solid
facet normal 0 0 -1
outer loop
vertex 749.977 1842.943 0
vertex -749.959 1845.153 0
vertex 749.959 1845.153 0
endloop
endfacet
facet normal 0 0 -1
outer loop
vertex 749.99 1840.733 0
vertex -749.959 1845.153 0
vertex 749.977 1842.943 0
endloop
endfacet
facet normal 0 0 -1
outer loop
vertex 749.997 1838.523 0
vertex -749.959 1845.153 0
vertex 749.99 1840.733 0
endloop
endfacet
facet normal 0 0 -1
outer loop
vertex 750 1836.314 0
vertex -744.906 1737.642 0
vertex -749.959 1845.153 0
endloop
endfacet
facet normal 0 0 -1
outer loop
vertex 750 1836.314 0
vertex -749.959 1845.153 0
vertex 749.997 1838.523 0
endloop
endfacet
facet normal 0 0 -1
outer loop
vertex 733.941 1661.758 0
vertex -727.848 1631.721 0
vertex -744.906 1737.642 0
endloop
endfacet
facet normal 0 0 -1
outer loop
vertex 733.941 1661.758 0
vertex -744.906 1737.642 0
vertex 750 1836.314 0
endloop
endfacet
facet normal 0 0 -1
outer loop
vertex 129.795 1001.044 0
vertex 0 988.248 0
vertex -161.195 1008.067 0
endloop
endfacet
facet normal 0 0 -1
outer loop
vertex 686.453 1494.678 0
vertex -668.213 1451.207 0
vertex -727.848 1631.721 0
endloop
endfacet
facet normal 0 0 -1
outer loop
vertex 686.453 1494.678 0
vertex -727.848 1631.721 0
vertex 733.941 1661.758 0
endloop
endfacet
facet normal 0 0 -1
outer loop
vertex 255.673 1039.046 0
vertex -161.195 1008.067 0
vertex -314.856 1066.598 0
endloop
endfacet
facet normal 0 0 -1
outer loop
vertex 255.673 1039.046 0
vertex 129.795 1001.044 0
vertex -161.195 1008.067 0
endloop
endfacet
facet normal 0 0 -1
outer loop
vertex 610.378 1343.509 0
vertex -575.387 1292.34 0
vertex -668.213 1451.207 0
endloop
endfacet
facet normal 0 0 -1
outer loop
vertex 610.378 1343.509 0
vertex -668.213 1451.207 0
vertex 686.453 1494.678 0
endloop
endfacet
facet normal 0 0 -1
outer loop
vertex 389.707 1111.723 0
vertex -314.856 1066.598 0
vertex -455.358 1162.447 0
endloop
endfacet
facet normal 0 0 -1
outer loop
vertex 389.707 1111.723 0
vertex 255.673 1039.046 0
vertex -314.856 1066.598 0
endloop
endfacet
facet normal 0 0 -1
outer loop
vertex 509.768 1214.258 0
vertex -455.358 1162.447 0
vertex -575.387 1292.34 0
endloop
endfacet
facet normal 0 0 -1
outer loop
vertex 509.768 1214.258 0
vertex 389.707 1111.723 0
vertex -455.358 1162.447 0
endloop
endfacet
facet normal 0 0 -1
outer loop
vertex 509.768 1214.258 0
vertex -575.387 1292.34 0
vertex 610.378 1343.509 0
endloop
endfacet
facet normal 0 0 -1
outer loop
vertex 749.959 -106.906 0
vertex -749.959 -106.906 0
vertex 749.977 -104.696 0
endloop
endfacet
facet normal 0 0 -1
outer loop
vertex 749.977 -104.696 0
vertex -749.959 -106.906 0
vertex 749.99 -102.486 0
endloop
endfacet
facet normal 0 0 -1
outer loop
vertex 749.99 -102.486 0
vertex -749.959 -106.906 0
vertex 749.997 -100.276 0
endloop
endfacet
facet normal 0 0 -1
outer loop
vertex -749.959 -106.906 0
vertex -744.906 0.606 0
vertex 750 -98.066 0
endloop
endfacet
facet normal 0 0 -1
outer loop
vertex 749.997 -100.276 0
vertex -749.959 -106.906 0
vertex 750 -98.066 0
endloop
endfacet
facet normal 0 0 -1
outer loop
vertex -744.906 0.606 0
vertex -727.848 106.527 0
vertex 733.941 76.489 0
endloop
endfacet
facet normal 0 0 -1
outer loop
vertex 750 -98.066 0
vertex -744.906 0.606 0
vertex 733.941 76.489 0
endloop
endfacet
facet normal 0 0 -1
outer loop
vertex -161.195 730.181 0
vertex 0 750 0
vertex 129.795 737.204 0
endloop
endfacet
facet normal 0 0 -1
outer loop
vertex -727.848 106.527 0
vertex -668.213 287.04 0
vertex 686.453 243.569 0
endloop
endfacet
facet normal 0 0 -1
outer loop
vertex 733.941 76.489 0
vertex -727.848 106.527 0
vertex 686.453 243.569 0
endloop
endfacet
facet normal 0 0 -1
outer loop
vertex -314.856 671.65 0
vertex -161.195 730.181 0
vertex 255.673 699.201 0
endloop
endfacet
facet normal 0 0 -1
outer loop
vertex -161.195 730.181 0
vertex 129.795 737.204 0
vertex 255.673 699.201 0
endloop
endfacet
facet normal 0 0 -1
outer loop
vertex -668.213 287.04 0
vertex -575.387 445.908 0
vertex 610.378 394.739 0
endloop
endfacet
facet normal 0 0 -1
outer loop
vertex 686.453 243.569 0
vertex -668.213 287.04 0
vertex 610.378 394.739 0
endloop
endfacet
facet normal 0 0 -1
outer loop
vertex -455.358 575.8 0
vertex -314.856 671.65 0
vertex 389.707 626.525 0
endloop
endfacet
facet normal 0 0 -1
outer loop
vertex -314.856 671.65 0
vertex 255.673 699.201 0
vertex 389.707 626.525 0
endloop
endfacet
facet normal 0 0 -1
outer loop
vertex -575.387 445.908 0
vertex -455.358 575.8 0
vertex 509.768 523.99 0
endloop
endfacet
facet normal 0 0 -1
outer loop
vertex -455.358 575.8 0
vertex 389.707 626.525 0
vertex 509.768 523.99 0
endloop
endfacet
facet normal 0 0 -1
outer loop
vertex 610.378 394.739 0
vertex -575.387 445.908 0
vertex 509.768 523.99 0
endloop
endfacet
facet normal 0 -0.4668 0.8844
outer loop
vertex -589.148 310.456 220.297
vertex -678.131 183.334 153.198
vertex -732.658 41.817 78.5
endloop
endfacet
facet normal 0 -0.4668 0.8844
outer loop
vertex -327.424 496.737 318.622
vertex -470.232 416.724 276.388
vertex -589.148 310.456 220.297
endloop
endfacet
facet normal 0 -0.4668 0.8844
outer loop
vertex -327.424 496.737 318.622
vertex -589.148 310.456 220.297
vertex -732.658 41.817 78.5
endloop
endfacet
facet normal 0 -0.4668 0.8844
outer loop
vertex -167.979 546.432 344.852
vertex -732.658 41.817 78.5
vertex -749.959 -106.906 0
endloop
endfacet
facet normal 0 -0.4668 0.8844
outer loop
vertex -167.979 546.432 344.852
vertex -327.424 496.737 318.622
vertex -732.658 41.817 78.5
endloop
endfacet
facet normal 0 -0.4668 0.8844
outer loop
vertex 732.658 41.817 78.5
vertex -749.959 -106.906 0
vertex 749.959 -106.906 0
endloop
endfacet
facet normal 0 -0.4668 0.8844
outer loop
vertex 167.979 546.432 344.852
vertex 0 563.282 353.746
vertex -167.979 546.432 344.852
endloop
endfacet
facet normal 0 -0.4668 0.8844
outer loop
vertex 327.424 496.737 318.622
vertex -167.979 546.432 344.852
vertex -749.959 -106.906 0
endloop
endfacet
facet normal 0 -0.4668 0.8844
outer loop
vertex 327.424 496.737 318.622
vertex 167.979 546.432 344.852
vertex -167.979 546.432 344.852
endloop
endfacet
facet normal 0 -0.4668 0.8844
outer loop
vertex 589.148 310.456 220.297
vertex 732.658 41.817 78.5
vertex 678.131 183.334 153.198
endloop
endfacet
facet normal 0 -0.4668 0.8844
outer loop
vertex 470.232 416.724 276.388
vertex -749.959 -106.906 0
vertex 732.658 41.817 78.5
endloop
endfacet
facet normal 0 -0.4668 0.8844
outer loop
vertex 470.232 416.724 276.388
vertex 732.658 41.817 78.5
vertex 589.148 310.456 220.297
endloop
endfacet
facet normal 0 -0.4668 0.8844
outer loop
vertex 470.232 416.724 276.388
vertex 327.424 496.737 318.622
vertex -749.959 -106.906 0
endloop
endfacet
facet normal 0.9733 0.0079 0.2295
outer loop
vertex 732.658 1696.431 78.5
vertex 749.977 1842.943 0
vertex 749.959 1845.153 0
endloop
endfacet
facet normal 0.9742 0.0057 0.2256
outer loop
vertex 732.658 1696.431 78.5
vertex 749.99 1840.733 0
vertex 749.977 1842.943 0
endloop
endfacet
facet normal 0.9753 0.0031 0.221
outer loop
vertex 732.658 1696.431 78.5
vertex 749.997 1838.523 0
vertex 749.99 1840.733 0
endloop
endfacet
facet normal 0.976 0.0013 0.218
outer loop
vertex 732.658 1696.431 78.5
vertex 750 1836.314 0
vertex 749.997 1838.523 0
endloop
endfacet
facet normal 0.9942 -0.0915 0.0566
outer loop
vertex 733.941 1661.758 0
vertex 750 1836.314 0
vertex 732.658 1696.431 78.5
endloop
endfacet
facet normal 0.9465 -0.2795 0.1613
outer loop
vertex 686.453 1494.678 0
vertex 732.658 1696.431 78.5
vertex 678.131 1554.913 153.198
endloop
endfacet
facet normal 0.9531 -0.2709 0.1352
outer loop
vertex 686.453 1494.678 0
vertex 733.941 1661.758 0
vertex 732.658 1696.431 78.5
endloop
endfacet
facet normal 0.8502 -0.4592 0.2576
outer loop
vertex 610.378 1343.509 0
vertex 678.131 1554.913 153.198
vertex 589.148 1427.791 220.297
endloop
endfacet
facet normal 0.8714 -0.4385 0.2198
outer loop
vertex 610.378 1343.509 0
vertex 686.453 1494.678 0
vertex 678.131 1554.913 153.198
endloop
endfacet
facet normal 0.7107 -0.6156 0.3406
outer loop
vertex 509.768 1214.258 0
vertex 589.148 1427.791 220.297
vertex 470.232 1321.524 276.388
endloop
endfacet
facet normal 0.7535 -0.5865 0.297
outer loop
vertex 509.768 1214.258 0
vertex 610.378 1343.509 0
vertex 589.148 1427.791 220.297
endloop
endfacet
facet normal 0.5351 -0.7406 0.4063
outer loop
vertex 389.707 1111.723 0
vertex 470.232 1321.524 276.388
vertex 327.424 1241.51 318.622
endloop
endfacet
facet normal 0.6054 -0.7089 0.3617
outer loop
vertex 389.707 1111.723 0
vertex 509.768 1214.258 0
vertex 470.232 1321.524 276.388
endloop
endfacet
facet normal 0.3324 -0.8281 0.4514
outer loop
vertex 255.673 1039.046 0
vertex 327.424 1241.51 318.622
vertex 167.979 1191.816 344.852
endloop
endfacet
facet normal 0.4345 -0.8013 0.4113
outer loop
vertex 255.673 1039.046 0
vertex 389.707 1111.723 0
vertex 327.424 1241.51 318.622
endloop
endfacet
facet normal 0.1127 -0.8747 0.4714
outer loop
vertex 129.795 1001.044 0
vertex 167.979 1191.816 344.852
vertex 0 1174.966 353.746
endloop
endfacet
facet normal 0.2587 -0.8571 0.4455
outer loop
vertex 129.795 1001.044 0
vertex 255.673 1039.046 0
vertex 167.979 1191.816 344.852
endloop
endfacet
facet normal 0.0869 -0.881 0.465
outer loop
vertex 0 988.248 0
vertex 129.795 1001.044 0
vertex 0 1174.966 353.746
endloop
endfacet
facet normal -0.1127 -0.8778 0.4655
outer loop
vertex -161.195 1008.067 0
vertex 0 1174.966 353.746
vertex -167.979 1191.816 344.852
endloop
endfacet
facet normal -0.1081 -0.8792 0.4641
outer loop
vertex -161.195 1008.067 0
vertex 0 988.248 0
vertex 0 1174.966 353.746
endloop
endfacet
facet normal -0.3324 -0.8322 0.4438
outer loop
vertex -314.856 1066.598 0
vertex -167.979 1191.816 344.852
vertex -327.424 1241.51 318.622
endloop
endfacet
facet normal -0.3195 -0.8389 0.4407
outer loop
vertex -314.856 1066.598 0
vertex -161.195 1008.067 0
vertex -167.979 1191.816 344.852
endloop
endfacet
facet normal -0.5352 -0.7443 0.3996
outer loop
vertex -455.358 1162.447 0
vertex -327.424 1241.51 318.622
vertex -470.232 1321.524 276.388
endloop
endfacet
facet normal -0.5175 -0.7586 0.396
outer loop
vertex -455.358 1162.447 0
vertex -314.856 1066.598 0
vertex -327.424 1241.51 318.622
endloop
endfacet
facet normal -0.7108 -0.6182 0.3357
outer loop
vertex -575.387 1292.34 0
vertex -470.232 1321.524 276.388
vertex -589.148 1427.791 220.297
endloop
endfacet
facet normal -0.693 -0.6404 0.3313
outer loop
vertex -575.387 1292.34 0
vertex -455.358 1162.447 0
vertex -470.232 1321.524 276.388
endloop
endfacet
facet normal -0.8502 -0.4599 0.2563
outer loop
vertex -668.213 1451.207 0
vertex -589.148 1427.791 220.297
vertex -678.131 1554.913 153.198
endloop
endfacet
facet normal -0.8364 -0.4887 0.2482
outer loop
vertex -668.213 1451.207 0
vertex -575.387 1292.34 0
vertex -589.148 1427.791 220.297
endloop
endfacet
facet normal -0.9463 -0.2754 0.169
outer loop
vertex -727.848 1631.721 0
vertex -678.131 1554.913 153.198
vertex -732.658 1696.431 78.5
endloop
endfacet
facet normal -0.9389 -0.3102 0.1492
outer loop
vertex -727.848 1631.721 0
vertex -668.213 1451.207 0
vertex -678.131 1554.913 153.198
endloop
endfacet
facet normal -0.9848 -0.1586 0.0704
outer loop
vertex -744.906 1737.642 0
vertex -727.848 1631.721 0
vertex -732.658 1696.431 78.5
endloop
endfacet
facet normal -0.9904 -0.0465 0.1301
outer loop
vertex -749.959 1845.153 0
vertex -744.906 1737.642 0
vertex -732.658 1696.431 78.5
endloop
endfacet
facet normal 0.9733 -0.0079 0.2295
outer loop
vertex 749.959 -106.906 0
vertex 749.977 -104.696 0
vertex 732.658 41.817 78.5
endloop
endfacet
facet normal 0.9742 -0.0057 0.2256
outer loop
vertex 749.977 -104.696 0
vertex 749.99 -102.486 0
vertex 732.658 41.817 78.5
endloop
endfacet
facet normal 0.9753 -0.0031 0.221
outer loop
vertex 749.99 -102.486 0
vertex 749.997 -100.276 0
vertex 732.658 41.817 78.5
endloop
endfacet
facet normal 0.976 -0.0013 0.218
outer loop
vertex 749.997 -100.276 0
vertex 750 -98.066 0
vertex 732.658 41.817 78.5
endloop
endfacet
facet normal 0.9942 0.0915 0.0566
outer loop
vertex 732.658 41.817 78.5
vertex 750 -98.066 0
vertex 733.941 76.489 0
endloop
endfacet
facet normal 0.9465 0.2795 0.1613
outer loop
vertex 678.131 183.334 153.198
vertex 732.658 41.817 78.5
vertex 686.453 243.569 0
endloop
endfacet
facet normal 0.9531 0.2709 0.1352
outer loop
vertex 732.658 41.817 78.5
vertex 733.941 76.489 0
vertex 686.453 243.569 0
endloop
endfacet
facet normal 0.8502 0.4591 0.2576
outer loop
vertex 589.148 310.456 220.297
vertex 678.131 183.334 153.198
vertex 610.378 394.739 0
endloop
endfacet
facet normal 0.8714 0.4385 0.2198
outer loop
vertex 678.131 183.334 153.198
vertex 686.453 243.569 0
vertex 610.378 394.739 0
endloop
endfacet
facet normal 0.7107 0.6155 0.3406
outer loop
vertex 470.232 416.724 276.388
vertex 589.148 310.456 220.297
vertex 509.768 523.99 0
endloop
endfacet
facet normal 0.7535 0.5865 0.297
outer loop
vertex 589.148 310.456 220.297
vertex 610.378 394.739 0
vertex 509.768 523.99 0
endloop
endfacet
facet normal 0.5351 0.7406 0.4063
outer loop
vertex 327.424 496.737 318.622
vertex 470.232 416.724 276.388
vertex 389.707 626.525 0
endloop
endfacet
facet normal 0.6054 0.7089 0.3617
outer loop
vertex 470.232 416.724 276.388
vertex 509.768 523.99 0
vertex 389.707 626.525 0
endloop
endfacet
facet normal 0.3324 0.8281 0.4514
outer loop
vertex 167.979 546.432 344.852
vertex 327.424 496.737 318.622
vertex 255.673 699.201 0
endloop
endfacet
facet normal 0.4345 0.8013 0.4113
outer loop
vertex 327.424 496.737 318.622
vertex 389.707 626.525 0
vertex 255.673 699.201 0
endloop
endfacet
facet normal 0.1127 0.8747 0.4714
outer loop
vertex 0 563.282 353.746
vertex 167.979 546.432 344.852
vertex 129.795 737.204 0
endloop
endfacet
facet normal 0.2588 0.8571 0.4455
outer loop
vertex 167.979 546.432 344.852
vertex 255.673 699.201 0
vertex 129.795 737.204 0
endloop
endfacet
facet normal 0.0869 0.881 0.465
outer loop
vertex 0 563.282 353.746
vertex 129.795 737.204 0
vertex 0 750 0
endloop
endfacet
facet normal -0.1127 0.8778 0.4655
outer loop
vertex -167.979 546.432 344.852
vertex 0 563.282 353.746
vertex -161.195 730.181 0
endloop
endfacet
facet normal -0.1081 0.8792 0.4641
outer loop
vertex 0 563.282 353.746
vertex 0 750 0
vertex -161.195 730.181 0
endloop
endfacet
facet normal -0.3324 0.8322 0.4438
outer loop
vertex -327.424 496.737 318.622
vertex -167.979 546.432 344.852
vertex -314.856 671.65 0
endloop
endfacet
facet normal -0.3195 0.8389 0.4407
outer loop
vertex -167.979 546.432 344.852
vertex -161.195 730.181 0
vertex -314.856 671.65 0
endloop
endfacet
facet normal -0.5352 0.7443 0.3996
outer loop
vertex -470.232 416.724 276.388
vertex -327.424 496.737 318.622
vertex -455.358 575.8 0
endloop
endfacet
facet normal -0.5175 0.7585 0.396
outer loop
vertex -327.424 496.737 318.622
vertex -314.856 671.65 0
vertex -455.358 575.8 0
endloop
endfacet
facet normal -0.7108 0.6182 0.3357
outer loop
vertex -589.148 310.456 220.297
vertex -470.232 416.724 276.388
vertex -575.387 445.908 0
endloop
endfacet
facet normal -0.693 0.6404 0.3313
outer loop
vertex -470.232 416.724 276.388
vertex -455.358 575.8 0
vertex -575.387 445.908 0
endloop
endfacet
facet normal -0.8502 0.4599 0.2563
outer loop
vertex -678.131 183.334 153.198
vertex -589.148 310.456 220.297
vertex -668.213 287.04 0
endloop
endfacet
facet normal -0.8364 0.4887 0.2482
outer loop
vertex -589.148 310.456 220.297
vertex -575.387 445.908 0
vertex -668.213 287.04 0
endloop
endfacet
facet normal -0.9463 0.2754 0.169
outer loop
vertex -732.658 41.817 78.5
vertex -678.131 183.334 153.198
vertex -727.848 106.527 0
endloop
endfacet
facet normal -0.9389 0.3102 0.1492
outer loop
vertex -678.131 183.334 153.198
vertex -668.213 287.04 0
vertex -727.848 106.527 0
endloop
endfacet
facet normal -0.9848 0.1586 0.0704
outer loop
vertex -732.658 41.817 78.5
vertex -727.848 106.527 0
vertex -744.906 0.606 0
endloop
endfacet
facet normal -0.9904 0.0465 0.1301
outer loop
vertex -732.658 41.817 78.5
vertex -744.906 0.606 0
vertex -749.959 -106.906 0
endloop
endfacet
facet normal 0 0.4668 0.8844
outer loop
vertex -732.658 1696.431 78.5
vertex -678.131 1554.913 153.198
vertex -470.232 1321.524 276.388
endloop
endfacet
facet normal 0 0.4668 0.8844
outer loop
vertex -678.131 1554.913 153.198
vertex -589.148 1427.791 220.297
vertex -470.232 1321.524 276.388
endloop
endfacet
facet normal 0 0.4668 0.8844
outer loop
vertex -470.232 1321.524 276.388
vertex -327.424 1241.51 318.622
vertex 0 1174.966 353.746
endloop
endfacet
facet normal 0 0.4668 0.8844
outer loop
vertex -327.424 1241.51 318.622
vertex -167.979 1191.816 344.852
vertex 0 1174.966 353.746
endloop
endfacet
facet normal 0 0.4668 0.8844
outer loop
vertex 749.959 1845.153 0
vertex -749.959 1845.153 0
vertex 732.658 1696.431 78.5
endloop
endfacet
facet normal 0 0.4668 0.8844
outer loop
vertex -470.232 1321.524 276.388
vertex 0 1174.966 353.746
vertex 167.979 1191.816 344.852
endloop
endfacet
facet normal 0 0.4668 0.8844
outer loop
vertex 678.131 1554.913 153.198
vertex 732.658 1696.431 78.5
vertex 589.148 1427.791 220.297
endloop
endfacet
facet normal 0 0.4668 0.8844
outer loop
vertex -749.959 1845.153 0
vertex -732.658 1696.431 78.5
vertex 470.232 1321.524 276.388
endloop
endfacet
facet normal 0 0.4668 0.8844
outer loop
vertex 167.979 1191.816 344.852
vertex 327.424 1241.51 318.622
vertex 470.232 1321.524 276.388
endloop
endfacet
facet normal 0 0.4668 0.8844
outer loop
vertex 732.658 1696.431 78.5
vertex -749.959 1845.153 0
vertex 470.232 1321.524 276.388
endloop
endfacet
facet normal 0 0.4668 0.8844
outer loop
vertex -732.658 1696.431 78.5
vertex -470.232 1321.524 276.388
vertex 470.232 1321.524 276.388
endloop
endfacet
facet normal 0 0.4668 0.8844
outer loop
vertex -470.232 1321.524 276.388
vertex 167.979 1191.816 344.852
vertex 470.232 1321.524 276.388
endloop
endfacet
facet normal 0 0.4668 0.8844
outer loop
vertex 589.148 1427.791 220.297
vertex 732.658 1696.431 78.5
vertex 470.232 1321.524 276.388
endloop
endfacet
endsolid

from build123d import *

# Parameters (mm, degrees)
F0_R     = 750
F1_DEPTH = 400
F2_ANGLE = -27.8265049099
F0_W     = 1825.8036160891
F0_H     = 1738.2475137711
F3_DEPTH = 1100


with BuildPart() as f1:
    # F0 (on Top) → F1 (new body)
    with BuildSketch(Plane.XY):
        Circle(F0_R)
    extrude(amount=F1_DEPTH)


with BuildPart() as f1_1:
    # F2: moved
    add(f1.part.rotate(Axis((-40.2899682522, 750, 0), (-1, 0, 0)), F2_ANGLE))

    # F0 (on Top) → F3 (cut)
    with BuildSketch(Plane.XY):
        Rectangle(F0_W, F0_H)
        Circle(F0_R, mode=Mode.SUBTRACT)
        Circle(F0_R)
    extrude(amount=-F3_DEPTH, mode=Mode.SUBTRACT)


with BuildPart() as f5_1:
    # F5: instance of F1
    add(f1_1.part.mirror(Plane.XZ.offset(-869.1237568855)))


solid = Compound([f1_1.part, f5_1.part])
